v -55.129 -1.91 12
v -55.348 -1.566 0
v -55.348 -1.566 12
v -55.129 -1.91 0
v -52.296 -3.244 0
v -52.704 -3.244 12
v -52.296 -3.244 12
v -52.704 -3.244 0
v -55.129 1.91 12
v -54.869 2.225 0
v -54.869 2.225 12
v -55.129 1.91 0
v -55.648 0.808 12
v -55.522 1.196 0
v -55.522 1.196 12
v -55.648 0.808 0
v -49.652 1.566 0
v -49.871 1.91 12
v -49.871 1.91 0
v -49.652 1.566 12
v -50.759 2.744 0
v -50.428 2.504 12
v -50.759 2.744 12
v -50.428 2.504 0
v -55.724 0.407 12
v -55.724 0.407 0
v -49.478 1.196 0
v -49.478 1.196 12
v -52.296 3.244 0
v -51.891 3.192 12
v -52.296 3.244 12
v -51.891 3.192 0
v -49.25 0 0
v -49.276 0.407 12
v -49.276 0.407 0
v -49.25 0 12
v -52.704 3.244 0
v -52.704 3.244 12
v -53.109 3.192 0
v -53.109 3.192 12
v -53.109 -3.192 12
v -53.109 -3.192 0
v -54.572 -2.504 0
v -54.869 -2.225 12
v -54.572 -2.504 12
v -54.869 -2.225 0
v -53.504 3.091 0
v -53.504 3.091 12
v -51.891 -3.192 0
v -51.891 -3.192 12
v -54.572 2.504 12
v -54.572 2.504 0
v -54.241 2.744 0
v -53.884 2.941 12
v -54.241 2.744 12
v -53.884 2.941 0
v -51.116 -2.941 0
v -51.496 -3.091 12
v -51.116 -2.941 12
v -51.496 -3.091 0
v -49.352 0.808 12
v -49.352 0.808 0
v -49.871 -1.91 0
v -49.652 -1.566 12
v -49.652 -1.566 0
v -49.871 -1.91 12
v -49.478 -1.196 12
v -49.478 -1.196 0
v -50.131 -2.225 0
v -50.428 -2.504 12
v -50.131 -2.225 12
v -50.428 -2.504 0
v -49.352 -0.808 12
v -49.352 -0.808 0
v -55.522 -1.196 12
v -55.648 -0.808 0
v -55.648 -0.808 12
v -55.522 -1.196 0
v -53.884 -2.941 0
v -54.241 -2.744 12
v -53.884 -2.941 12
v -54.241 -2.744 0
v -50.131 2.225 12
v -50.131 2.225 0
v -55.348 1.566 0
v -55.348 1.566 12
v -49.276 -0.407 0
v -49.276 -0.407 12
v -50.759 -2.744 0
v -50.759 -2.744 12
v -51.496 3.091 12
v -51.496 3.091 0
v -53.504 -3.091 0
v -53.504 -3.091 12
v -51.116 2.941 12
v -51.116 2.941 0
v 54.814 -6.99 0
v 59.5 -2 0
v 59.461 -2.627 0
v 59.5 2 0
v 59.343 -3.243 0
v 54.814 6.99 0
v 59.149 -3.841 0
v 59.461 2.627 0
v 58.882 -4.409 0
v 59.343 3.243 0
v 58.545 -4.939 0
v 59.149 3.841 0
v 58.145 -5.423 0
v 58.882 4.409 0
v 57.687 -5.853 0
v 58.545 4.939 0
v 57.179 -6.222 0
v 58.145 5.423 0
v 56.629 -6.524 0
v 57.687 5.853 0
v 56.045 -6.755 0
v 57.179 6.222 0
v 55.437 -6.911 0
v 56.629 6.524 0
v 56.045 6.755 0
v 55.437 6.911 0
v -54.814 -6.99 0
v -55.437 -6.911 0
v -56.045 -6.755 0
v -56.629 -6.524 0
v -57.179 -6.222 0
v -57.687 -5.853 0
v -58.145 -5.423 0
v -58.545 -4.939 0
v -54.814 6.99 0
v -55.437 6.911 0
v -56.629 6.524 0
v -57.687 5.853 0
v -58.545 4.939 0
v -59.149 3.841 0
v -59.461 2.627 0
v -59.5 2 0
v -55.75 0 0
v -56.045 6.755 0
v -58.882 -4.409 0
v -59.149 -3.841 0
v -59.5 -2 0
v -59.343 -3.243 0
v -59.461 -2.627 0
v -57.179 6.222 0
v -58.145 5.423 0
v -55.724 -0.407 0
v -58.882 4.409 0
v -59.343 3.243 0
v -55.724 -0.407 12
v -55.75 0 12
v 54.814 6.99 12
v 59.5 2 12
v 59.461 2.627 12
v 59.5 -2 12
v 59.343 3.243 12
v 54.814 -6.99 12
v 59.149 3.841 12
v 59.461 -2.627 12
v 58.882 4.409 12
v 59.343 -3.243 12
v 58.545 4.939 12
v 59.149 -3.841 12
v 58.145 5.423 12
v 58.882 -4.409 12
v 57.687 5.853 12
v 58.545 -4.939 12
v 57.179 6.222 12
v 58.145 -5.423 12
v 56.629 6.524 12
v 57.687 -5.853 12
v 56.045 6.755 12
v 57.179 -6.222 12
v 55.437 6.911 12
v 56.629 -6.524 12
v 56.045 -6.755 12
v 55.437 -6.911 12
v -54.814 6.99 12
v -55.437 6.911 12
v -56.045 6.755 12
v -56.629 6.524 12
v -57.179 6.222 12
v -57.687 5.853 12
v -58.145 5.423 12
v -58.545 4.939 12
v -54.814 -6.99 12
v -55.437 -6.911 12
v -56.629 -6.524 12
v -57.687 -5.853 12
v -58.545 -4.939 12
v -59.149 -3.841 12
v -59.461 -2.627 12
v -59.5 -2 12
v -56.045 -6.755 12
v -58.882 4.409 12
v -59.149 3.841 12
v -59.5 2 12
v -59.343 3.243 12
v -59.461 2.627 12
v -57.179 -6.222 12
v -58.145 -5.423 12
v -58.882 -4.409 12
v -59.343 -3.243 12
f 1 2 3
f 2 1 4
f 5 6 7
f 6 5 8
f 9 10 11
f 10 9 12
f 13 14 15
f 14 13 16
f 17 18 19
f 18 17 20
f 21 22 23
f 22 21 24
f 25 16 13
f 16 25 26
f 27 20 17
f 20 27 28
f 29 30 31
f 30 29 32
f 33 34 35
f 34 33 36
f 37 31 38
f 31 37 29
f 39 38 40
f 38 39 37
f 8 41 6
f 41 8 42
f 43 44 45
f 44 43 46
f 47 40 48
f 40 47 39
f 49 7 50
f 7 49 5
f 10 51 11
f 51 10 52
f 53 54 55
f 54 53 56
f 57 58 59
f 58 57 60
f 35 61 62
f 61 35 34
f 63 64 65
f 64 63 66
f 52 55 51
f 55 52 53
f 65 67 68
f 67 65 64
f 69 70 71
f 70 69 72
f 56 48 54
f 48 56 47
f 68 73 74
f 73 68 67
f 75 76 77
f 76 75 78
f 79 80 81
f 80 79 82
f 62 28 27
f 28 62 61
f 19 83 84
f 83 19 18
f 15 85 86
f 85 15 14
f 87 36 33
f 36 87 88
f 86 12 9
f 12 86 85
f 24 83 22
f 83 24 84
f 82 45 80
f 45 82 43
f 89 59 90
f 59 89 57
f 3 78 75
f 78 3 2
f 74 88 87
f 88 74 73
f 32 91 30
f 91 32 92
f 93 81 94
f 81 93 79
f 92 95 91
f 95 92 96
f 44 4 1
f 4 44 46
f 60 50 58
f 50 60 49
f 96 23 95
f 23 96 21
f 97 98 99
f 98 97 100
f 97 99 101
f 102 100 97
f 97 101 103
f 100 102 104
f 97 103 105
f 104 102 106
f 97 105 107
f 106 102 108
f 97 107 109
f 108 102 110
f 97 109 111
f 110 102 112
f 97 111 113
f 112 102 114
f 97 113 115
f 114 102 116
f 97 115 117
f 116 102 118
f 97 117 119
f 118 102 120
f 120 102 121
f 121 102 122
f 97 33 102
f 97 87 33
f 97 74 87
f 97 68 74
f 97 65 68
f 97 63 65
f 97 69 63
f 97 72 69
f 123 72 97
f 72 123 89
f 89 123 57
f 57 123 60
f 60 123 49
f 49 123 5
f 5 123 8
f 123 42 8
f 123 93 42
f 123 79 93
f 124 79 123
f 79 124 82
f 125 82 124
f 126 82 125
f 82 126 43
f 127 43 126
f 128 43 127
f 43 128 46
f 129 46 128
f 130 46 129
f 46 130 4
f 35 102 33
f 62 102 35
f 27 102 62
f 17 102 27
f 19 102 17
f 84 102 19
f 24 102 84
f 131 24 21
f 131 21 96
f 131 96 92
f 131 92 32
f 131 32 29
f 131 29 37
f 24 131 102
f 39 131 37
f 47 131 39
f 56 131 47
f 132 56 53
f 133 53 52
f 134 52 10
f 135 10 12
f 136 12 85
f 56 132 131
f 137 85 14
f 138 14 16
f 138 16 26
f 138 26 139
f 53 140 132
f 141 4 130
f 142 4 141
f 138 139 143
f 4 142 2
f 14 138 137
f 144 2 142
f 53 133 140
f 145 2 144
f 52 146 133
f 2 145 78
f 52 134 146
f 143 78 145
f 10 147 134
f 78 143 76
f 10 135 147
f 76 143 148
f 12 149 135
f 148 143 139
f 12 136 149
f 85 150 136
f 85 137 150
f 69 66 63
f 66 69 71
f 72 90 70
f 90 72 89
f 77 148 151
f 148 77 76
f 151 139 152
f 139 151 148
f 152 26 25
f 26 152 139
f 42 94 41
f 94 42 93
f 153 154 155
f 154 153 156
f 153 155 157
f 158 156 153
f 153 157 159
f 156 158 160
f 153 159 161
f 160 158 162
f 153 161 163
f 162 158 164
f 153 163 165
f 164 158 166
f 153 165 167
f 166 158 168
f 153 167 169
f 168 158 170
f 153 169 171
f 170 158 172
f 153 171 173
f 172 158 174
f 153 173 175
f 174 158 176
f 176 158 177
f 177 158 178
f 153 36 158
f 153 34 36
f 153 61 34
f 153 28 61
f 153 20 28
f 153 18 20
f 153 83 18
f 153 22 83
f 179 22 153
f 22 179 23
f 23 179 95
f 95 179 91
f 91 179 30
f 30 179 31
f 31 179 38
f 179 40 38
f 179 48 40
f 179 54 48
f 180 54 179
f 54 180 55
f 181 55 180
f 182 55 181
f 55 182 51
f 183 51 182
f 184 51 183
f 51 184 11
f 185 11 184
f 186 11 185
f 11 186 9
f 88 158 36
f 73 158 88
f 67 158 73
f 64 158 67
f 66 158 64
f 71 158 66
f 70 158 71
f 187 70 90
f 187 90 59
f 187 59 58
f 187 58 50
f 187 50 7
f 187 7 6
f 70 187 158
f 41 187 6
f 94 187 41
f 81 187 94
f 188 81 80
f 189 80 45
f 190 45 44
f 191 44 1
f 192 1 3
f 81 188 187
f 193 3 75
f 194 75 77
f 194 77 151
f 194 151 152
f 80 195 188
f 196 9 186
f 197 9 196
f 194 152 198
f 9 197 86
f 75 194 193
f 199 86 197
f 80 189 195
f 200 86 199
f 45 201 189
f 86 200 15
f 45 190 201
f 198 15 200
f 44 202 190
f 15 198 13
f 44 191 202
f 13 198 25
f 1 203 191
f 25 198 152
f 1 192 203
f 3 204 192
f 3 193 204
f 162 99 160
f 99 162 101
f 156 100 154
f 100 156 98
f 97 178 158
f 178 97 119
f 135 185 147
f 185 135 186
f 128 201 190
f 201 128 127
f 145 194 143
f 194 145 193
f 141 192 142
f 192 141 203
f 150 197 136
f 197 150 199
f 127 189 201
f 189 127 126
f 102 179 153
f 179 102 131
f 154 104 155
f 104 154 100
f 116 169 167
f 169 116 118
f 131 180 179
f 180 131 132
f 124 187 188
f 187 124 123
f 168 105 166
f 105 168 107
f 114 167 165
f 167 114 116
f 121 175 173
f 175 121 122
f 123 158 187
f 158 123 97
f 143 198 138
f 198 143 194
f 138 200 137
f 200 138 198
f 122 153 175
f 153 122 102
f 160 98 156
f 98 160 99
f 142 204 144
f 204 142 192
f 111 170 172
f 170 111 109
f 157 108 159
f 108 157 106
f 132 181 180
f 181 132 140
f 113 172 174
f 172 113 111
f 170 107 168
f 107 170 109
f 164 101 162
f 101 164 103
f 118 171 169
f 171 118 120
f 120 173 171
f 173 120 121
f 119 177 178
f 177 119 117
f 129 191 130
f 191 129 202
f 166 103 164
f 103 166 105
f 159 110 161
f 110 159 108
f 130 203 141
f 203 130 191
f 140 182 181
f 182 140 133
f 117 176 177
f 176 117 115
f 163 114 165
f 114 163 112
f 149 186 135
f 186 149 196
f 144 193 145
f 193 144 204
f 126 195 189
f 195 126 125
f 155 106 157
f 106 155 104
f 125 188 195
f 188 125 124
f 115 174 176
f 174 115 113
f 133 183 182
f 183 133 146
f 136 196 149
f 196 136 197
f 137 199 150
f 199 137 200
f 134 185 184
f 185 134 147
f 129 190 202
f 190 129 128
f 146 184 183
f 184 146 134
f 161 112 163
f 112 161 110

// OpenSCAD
$fn = 50;


difference() {
	union() {
		hull() {
			translate(v = [-54.5000000000, 2.0000000000, 0]) {
				cylinder(h = 12, r = 5);
			}
			translate(v = [54.5000000000, 2.0000000000, 0]) {
				cylinder(h = 12, r = 5);
			}
			translate(v = [-54.5000000000, -2.0000000000, 0]) {
				cylinder(h = 12, r = 5);
			}
			translate(v = [54.5000000000, -2.0000000000, 0]) {
				cylinder(h = 12, r = 5);
			}
		}
	}
	union() {
		translate(v = [-52.5000000000, 0.0000000000, 0]) {
			cylinder(h = 12, r = 3.2500000000);
		}
		translate(v = [-52.5000000000, 0.0000000000, 0]) {
			cylinder(h = 12, r = 1.8000000000);
		}
		translate(v = [-52.5000000000, 0.0000000000, 0]) {
			cylinder(h = 12, r = 1.8000000000);
		}
		translate(v = [-52.5000000000, 0.0000000000, 0]) {
			cylinder(h = 12, r = 1.8000000000);
		}
	}
}
